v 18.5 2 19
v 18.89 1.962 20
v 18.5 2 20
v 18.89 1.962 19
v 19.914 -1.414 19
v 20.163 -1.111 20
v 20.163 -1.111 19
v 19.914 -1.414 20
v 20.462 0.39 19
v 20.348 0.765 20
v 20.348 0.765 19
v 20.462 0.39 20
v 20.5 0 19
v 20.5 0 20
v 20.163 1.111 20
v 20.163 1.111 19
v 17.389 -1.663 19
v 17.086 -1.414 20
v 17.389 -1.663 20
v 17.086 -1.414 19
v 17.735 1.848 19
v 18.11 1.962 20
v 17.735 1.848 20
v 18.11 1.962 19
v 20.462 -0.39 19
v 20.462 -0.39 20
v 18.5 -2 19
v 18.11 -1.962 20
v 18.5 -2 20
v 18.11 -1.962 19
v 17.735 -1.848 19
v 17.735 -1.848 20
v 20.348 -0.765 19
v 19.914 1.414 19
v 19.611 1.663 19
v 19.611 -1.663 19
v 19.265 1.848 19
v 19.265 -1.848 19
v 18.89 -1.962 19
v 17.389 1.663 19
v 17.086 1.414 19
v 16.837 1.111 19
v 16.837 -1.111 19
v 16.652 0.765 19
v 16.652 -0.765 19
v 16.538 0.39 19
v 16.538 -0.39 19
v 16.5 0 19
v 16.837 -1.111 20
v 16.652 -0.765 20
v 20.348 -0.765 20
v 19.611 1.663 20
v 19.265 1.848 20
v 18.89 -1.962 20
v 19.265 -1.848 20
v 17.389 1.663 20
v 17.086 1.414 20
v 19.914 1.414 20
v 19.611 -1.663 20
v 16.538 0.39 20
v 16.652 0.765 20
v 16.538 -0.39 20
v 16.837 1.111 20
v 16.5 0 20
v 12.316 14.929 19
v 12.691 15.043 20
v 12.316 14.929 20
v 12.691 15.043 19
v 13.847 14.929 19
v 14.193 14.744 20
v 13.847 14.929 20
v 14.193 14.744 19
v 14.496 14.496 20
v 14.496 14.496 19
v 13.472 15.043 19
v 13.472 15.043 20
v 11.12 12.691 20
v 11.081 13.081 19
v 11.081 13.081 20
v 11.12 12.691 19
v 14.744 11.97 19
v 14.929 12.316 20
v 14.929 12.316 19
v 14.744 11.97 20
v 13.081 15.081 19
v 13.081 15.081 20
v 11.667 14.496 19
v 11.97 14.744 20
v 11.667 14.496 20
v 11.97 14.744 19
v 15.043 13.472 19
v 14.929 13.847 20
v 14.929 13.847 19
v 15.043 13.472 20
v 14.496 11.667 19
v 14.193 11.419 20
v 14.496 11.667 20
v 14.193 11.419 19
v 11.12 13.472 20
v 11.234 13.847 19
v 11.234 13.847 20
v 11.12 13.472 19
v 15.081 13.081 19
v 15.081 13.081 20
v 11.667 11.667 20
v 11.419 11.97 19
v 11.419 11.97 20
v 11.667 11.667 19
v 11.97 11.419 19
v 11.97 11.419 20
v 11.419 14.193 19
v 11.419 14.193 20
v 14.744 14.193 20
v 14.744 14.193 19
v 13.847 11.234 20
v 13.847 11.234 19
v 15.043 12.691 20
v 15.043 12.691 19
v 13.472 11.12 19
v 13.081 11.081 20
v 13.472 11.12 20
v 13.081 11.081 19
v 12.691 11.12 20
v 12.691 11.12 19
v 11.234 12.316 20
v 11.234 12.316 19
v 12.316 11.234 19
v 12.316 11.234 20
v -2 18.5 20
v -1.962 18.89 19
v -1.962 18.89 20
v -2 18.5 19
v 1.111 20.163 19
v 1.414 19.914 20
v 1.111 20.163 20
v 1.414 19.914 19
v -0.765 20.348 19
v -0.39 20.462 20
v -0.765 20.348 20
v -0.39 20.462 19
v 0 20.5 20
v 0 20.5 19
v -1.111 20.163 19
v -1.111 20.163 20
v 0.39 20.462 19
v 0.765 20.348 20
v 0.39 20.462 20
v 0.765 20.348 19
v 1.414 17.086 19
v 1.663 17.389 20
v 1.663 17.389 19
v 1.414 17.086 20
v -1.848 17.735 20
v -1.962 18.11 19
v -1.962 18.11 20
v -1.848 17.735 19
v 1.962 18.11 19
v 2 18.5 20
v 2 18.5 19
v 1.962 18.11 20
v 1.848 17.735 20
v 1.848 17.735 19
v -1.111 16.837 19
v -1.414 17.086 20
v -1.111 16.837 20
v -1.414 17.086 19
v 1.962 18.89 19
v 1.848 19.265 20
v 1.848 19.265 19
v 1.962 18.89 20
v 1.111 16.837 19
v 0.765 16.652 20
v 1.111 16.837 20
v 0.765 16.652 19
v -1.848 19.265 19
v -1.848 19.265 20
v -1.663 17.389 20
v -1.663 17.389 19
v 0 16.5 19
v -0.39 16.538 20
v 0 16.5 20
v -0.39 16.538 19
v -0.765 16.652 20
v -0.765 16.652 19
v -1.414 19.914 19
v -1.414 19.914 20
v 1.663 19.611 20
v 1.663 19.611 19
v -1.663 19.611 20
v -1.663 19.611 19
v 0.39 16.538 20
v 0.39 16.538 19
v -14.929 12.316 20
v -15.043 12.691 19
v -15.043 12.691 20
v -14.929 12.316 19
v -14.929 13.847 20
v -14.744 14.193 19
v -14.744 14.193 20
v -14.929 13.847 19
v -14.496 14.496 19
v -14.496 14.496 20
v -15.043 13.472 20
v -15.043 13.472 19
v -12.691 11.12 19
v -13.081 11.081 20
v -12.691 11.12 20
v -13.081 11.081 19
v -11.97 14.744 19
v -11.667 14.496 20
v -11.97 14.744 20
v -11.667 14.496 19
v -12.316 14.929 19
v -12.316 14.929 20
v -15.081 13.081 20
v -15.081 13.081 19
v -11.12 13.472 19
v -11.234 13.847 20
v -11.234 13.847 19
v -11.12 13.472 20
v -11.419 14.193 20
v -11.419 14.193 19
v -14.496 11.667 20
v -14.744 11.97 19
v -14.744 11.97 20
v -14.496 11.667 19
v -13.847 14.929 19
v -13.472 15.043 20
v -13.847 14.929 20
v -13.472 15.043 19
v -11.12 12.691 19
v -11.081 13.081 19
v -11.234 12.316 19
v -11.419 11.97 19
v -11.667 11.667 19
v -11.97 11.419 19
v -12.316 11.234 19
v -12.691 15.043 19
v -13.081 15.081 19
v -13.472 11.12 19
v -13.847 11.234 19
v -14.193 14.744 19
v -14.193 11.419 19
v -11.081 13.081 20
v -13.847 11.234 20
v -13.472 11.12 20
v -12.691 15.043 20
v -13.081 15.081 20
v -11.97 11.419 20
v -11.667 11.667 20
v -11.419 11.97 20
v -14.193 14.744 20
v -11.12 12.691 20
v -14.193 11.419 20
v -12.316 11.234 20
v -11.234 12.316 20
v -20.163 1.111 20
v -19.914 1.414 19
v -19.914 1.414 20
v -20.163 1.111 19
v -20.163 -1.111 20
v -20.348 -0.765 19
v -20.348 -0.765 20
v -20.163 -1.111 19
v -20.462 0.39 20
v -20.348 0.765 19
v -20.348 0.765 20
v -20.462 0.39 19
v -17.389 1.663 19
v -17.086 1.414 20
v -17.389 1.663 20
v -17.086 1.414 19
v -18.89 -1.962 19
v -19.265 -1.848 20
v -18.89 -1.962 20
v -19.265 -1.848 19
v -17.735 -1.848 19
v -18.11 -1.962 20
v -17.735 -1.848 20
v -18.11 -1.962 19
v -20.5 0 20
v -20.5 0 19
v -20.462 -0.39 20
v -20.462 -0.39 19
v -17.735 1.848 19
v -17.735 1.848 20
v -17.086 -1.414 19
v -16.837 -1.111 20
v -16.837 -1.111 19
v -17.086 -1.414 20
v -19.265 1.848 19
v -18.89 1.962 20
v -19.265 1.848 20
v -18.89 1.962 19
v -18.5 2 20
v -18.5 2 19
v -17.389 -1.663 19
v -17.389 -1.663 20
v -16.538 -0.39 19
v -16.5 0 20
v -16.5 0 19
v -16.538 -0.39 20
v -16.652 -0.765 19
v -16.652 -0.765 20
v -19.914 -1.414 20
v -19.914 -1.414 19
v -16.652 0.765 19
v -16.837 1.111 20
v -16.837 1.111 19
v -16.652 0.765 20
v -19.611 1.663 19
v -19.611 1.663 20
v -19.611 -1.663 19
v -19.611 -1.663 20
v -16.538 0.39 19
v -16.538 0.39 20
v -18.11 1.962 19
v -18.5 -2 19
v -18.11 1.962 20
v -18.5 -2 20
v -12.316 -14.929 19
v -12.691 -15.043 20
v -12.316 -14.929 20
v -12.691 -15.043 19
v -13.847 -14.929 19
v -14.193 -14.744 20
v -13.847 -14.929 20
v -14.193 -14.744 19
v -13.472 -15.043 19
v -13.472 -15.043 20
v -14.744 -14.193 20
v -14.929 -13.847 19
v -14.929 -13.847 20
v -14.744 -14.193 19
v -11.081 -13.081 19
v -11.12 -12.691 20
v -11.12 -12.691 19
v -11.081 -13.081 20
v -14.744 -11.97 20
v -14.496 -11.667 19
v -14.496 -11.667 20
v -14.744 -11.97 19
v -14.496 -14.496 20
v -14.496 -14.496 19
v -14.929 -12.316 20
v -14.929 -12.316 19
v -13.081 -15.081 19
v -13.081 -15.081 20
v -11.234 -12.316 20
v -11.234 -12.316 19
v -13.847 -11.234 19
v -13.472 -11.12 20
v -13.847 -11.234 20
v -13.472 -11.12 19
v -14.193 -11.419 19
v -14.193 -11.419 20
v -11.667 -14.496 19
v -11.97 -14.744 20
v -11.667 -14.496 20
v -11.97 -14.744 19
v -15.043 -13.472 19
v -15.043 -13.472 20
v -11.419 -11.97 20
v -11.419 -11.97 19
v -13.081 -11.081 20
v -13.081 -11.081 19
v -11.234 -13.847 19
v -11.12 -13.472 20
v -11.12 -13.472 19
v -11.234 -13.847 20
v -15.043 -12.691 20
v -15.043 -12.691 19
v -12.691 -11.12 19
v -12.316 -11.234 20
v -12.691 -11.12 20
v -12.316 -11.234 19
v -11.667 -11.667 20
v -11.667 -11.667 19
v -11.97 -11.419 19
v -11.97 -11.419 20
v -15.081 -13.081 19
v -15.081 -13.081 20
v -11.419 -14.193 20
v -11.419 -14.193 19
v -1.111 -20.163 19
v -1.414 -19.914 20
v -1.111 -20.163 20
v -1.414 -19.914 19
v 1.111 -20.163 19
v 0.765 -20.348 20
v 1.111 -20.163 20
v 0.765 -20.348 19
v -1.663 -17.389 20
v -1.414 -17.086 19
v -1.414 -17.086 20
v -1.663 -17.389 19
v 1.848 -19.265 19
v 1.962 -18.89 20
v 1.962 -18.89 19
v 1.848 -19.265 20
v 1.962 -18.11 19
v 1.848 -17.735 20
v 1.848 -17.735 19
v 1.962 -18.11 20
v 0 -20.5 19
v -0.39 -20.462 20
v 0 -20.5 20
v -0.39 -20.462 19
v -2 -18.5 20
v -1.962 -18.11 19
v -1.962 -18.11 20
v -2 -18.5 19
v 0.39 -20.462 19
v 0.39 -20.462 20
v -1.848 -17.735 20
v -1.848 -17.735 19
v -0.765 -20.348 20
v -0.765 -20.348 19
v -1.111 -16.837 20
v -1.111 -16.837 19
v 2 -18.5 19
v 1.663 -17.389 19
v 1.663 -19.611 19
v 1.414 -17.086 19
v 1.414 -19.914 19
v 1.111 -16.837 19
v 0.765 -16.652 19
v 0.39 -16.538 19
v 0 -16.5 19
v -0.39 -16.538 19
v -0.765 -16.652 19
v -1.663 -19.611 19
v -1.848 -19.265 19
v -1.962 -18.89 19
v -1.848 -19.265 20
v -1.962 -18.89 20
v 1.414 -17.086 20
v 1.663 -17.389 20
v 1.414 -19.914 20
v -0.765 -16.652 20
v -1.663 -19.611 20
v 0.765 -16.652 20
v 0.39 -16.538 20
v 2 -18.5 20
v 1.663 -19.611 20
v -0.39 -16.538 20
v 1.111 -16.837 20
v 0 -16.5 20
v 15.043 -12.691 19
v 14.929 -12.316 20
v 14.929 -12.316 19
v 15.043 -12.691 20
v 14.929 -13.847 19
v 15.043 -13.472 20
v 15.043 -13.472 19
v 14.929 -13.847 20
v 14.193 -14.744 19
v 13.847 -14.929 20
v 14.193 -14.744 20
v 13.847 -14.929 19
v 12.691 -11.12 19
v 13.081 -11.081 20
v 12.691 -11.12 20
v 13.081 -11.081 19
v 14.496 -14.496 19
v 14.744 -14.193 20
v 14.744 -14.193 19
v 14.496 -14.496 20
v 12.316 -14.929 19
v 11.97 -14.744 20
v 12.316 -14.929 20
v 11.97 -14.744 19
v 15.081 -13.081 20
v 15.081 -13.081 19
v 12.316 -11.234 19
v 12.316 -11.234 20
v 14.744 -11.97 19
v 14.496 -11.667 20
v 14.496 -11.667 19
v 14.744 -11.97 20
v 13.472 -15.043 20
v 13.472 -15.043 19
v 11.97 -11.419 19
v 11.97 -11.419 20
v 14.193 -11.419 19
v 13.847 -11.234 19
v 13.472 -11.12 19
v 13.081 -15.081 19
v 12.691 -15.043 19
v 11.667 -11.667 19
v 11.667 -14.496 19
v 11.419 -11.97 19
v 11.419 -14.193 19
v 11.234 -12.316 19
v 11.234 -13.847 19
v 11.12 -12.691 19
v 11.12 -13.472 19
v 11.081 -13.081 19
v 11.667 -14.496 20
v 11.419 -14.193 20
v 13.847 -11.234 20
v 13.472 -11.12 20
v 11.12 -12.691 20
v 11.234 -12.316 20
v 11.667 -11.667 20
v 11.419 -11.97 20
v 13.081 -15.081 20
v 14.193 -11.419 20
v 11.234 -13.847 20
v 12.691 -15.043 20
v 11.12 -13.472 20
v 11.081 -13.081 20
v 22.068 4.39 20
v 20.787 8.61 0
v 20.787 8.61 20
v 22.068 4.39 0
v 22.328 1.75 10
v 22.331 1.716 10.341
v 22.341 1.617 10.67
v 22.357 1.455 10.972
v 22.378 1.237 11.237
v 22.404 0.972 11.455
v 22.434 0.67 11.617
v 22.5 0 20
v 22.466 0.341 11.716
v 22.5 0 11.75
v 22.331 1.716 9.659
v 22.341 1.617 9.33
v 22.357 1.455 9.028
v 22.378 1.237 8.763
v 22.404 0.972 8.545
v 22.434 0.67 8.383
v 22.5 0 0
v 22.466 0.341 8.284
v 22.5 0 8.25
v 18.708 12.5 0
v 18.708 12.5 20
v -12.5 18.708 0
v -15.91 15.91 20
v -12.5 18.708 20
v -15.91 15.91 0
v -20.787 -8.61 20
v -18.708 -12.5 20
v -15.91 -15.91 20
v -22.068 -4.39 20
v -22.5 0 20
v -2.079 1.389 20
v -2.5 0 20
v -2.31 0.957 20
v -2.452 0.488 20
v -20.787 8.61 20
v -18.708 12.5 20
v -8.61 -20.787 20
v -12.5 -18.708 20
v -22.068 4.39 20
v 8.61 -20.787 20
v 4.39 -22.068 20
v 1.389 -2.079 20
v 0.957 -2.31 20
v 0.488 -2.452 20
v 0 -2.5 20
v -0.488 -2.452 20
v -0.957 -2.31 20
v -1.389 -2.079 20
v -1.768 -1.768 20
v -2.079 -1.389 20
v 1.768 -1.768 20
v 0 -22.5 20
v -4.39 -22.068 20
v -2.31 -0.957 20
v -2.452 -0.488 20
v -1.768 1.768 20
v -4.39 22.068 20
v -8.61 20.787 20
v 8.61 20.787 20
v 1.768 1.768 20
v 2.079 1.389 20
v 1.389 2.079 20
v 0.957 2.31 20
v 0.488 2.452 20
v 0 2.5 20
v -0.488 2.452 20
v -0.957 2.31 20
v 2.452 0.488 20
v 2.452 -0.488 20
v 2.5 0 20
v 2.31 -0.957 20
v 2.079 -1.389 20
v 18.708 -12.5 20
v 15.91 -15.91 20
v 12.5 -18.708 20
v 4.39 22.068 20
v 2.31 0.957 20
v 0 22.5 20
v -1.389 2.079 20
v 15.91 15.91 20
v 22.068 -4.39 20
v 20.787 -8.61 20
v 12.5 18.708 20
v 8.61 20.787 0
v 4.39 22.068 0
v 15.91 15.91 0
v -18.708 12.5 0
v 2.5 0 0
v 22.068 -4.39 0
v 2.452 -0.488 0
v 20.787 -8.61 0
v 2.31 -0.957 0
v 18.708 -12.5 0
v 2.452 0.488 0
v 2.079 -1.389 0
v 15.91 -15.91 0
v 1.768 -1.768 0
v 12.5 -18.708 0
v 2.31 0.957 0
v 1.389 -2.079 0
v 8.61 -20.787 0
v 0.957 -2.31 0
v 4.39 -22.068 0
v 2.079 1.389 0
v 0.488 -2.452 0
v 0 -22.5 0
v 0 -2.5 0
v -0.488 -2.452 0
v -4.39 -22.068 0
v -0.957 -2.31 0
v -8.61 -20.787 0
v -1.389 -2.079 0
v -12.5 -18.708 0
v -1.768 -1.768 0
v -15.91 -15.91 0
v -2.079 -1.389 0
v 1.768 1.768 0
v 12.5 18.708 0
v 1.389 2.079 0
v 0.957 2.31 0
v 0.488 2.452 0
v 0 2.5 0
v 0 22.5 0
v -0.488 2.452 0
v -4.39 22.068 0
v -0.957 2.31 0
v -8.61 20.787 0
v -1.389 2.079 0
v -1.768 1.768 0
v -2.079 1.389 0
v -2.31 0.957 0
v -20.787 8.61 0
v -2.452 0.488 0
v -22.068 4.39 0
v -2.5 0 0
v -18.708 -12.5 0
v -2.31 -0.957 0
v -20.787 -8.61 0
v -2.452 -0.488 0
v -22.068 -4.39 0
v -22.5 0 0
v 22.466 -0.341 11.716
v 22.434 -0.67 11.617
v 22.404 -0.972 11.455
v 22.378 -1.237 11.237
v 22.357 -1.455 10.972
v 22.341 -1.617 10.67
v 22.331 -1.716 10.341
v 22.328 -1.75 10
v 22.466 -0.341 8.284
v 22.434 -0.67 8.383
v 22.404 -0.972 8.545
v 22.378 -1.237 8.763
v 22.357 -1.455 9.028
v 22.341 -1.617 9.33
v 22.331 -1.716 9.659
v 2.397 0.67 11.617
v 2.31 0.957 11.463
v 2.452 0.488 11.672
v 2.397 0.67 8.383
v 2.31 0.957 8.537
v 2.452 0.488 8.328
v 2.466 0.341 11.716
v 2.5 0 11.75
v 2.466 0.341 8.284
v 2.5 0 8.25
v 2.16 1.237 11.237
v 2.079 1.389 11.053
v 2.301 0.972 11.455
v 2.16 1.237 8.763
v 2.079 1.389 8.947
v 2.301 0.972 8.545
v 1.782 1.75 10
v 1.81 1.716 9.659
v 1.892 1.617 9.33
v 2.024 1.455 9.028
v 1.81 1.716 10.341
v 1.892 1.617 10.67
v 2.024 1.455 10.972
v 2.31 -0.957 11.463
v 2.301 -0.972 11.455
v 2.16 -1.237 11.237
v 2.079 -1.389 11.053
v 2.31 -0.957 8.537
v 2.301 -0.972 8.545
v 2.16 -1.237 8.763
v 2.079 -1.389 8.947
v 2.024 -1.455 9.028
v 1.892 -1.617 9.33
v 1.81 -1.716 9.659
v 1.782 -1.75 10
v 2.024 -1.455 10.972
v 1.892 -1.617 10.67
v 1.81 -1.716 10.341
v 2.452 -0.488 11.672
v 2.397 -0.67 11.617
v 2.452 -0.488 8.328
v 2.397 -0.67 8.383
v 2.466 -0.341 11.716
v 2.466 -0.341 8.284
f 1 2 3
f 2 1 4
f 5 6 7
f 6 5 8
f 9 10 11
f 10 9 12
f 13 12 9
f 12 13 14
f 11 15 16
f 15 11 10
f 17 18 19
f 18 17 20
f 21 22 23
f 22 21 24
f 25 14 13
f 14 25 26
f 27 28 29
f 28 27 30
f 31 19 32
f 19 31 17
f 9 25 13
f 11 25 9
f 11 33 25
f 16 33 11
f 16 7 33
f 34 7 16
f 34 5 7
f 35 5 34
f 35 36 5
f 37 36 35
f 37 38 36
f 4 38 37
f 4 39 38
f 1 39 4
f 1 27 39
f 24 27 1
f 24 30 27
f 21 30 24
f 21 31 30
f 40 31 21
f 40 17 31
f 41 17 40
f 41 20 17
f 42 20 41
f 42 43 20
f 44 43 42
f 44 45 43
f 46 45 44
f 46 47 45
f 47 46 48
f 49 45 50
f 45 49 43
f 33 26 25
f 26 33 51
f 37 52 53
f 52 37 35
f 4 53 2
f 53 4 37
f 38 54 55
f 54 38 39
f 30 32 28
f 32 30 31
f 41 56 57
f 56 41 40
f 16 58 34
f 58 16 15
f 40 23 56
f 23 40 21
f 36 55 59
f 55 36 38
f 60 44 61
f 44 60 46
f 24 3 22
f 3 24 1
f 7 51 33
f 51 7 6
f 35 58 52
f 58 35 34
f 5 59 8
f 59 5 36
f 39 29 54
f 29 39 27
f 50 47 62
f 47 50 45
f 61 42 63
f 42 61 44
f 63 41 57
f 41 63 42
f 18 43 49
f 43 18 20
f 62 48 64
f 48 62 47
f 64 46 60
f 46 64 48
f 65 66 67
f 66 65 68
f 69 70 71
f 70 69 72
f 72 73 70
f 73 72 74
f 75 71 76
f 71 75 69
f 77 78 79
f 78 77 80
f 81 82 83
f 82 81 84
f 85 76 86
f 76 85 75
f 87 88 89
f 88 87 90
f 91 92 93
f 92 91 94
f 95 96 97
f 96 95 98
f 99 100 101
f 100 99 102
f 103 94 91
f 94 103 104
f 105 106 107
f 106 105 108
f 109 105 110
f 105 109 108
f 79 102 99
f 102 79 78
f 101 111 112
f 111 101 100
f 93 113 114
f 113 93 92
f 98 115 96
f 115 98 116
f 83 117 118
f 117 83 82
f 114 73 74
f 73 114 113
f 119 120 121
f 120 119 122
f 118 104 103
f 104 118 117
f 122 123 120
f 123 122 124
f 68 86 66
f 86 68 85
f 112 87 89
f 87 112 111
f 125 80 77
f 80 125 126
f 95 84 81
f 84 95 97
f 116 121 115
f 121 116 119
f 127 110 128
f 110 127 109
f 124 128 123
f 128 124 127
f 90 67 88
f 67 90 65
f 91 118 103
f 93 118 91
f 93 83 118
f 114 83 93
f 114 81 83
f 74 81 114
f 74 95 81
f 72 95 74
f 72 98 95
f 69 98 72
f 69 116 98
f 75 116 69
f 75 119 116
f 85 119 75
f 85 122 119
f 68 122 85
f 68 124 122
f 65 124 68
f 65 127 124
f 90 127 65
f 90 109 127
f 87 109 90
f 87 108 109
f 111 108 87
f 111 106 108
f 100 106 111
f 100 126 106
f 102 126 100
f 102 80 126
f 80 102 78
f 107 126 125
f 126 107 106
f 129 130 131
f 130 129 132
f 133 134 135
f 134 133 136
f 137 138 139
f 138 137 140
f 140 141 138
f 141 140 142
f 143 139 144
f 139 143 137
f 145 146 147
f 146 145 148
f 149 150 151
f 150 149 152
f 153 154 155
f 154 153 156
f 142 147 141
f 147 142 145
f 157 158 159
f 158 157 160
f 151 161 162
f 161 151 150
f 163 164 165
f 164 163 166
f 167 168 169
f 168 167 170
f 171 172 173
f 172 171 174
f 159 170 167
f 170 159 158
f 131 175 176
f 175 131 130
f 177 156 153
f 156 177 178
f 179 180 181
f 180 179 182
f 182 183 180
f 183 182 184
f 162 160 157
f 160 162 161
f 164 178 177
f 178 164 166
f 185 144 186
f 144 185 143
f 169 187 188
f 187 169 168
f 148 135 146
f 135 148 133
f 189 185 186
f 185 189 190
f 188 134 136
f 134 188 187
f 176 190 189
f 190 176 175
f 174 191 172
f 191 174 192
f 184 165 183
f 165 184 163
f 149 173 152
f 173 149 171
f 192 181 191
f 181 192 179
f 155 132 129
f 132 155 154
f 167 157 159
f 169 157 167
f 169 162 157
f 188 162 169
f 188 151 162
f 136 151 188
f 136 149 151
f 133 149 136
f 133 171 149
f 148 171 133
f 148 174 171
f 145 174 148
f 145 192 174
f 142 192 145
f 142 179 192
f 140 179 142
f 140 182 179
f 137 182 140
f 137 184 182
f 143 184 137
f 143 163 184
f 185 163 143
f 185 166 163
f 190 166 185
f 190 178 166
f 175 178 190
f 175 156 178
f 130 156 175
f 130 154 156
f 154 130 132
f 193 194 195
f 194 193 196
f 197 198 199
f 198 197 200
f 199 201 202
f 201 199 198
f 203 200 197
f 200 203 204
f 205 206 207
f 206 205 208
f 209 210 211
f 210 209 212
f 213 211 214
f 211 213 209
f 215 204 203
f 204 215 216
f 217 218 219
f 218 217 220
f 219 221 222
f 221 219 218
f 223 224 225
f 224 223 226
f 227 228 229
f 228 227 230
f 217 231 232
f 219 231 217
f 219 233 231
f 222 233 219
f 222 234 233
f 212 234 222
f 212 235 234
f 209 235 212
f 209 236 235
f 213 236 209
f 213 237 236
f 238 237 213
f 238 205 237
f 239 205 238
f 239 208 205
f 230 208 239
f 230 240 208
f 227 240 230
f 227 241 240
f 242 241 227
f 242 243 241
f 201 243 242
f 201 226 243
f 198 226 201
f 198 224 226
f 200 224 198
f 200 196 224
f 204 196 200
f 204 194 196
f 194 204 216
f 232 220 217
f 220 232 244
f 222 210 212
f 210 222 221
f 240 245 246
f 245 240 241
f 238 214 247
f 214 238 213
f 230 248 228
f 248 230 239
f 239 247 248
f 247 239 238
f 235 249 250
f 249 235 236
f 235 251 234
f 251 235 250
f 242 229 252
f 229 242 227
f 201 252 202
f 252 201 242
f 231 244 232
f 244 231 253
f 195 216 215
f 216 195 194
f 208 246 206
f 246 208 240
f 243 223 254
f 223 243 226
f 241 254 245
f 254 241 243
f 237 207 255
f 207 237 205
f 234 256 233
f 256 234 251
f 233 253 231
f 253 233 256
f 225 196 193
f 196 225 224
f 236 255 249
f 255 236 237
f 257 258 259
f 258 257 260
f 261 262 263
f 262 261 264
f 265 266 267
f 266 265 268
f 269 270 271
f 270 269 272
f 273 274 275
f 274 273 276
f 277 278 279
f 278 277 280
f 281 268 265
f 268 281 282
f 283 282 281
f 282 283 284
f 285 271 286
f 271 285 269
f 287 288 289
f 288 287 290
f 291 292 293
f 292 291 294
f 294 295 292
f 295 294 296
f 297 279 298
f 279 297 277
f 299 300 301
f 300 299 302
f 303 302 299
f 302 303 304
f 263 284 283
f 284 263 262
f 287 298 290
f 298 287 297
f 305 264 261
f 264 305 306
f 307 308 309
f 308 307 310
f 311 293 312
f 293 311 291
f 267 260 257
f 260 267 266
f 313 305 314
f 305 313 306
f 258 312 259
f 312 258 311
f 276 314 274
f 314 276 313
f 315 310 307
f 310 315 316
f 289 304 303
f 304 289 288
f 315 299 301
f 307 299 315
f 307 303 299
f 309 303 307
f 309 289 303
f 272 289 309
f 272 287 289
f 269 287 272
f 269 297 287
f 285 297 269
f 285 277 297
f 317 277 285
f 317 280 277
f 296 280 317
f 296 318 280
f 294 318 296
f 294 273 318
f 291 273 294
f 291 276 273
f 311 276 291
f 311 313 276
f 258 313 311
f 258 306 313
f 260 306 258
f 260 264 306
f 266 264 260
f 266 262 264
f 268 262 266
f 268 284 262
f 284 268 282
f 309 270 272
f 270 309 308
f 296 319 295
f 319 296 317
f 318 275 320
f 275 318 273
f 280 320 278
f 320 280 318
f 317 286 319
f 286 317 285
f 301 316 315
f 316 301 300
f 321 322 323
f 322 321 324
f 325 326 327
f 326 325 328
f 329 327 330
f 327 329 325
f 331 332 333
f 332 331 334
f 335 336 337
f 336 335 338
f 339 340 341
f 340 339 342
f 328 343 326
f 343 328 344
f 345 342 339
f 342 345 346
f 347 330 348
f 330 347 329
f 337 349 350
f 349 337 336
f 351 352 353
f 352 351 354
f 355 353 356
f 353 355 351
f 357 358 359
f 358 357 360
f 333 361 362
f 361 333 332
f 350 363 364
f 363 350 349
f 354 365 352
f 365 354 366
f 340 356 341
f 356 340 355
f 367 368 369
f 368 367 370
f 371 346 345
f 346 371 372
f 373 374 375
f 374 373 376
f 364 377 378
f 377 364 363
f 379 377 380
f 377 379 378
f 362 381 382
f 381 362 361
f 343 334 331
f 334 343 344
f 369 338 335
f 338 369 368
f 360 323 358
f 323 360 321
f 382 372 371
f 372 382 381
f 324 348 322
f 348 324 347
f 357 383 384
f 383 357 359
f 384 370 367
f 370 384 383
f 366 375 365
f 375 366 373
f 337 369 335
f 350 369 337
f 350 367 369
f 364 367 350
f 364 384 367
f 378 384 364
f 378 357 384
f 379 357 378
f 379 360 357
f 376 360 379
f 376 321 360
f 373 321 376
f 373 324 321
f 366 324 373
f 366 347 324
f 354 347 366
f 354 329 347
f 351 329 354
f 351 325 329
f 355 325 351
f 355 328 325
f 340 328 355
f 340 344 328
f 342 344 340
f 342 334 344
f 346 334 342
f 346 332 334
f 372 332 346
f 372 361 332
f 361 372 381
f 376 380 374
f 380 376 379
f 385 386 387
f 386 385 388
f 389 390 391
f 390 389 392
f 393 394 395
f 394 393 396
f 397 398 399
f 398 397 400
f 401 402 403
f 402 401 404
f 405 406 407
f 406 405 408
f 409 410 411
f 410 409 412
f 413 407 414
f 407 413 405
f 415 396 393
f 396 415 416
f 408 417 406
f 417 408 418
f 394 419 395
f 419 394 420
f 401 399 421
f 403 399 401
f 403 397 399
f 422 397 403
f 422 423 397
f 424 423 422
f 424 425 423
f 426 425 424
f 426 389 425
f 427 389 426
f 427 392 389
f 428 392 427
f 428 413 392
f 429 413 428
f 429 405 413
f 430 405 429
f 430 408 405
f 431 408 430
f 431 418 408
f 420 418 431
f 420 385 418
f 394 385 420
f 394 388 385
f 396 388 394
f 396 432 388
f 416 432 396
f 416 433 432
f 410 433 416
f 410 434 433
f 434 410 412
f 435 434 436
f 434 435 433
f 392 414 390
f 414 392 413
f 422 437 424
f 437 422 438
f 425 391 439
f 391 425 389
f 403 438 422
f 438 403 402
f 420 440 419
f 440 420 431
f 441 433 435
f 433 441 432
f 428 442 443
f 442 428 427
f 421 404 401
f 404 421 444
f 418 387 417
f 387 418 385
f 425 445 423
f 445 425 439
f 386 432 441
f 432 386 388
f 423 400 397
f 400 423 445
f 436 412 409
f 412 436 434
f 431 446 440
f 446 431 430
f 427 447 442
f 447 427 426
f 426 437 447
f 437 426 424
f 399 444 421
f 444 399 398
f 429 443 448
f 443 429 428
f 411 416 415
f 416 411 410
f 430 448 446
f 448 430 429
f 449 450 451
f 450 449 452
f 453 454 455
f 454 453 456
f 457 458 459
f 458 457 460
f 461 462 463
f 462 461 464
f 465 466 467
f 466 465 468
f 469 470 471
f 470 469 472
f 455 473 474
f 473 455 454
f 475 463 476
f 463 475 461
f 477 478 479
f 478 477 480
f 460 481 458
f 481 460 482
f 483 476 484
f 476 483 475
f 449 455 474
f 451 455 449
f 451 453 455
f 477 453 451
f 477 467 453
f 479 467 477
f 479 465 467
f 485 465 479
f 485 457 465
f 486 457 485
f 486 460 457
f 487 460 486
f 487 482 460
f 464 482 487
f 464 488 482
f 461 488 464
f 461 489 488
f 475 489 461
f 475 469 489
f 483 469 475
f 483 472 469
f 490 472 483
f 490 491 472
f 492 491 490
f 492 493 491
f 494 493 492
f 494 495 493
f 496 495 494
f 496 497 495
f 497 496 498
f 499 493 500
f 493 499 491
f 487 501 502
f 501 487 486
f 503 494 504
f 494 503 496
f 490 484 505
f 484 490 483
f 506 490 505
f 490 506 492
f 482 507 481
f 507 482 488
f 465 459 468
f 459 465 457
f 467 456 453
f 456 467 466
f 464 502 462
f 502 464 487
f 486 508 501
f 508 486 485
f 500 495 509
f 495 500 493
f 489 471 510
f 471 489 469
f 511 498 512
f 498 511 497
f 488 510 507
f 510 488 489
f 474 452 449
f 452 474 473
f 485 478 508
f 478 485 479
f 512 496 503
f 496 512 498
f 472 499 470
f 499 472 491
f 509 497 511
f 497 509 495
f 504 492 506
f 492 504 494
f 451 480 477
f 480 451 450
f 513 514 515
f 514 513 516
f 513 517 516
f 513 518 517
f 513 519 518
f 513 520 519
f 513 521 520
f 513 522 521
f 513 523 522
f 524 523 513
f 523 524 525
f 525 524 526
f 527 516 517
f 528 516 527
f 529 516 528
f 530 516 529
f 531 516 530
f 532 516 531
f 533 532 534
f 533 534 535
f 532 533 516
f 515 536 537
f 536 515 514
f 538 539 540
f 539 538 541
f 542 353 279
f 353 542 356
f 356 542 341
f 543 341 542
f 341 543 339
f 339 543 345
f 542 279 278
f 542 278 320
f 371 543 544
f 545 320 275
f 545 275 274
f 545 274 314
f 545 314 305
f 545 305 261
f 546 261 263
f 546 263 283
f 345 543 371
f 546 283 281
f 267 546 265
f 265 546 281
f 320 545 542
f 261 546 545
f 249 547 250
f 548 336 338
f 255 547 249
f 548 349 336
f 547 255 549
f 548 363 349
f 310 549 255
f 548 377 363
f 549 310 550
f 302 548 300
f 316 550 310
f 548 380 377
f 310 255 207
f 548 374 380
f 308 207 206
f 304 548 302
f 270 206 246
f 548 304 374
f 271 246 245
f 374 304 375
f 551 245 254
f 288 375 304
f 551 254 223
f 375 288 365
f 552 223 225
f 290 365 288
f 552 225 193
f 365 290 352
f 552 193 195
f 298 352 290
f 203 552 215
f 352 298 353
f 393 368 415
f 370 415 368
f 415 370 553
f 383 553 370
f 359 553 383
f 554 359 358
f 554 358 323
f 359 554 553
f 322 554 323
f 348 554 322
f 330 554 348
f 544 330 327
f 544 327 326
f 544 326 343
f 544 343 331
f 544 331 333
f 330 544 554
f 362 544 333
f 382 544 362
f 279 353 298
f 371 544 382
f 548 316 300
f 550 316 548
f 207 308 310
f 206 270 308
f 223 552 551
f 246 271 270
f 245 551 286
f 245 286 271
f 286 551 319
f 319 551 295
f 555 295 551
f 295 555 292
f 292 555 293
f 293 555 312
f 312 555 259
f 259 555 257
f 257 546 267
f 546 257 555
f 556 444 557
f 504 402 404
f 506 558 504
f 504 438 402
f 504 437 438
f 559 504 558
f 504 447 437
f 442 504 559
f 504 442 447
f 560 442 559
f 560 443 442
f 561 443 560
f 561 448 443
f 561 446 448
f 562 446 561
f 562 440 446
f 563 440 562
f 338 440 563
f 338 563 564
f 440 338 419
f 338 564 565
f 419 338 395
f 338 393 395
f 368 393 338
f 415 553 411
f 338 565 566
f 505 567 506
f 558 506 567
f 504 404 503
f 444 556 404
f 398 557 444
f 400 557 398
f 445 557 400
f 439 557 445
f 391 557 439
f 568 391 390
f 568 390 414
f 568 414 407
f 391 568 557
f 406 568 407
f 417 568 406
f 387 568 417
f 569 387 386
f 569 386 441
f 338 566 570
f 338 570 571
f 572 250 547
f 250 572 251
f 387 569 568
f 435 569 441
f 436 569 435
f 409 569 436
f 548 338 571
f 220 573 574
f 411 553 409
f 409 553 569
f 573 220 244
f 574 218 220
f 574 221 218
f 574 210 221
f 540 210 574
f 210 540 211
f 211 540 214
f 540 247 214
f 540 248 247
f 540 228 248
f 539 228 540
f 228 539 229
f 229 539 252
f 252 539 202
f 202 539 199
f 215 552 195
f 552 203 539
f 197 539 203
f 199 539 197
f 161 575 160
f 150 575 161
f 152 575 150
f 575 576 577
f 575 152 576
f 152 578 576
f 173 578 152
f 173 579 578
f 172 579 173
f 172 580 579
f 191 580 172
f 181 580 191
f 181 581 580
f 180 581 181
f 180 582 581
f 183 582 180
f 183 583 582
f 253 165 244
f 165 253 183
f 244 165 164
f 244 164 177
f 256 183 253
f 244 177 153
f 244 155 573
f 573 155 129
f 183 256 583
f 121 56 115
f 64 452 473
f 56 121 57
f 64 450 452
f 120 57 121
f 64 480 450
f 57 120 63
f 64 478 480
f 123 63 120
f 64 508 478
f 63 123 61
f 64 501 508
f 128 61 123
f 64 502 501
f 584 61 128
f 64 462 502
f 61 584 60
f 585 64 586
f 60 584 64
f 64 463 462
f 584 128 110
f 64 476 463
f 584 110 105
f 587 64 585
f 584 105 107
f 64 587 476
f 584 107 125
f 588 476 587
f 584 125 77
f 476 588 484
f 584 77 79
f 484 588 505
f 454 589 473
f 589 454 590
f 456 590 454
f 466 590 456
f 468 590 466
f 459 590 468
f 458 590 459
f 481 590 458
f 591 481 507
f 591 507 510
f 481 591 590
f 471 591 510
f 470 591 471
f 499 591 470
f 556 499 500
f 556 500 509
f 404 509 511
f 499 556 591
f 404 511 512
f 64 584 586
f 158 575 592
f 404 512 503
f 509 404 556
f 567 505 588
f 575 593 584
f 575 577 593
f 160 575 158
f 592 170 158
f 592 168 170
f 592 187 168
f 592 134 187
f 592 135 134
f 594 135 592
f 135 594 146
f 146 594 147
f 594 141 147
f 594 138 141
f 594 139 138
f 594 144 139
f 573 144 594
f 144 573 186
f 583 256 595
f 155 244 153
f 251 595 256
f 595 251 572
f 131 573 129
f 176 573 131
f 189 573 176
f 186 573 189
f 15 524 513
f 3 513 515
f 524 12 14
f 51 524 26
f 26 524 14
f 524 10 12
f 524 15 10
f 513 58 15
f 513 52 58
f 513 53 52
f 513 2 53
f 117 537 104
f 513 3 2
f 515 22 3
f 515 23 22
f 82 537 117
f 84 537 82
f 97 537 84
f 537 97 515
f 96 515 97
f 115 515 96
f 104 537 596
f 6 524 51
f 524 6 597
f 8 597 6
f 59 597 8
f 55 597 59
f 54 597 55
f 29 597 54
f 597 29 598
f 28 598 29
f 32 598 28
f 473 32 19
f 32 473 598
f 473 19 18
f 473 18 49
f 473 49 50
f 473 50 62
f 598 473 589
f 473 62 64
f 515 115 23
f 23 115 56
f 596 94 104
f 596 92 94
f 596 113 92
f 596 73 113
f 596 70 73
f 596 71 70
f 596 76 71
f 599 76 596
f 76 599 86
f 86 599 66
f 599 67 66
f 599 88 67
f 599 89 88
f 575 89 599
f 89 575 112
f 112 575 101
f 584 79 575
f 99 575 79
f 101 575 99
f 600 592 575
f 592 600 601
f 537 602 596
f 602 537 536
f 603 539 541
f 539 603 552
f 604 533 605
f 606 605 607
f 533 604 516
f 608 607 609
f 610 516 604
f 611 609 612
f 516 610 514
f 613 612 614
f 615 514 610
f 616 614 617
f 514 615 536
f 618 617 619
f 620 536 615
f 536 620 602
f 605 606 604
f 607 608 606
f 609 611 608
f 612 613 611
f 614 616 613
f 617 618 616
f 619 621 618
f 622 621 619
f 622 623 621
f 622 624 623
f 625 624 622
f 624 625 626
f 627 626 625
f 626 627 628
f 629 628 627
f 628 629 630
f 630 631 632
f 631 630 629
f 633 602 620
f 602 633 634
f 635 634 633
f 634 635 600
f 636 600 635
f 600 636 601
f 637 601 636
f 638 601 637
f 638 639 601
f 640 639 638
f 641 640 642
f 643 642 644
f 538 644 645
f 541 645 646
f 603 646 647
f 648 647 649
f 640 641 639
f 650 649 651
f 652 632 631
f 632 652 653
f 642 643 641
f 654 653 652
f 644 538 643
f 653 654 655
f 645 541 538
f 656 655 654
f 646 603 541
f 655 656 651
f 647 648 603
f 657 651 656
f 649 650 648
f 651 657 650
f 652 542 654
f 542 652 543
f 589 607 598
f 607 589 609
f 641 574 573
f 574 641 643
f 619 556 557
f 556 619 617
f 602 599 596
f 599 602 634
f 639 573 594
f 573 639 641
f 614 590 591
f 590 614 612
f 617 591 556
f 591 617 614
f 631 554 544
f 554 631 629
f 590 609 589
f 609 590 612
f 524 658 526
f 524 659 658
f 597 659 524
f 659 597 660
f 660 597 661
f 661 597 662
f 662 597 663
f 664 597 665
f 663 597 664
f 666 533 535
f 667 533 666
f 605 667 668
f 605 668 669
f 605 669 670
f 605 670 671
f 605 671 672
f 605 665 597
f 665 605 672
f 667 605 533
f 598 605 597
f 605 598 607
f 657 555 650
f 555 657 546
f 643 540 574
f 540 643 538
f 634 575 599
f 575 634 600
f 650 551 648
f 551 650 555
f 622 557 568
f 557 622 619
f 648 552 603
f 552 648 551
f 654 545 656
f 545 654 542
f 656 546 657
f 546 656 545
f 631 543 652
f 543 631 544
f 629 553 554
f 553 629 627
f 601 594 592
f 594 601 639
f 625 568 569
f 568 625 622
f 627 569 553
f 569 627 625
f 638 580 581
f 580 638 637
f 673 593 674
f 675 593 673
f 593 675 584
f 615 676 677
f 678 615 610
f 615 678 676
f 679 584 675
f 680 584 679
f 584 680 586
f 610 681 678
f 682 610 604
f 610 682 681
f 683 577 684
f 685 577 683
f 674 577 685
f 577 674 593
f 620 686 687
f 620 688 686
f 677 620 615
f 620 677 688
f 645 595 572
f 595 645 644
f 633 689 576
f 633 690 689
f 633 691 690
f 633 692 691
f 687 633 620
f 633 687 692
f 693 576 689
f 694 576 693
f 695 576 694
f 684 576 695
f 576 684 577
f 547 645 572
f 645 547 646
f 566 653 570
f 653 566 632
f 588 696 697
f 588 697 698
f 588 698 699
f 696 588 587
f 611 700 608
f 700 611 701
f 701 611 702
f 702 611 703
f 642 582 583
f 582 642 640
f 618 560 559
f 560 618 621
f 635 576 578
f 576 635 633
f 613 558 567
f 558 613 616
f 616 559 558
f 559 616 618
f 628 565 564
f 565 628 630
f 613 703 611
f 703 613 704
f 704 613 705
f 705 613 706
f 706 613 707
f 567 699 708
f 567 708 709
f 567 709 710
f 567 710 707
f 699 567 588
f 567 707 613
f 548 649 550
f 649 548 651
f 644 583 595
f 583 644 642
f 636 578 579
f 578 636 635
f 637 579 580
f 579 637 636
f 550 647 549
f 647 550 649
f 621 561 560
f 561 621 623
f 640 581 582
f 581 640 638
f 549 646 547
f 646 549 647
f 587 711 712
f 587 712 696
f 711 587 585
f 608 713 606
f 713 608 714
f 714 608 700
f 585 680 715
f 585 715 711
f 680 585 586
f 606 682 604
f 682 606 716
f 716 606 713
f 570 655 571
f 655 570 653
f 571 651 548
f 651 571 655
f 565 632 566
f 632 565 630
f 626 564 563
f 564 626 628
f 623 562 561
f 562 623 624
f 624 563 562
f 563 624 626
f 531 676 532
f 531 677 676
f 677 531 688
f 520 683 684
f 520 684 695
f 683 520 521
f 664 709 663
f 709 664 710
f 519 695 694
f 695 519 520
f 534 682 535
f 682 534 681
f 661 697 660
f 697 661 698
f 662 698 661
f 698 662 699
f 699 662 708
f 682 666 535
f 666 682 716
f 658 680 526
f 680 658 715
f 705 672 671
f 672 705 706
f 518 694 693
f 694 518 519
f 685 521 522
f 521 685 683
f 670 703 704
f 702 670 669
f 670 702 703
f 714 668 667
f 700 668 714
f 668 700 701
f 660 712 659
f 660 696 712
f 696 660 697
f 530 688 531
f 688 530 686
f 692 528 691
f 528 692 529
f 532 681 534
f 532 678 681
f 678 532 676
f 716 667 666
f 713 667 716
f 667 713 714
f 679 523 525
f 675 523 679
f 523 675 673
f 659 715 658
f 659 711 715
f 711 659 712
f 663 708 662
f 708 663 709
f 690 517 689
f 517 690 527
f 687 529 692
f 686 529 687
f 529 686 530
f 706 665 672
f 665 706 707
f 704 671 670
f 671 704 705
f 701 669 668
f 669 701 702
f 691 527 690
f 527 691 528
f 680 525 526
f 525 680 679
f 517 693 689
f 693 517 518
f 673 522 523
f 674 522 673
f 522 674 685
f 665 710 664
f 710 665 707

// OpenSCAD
$fn = 32;

// ----------------------------------------------------------------------
// Control knob: dimpled knob
// ----------------------------------------------------------------------

// --- parameters (mm) ---
dimp_d = 4;               // finger dimple diameter
n_dimp = 8;               // number of dimples
dimp_r = 18.5;            // dimple ring radius
knob_d = 45;              // knob body diameter
knob_h = 20;              // knob body height
bore_d = 5;               // shaft bore diameter
set_d = 3.5;              // set screw bore diameter

dimp_step = 360 / n_dimp;  // dimple angular step

difference() {
  cylinder(h = knob_h, d = knob_d);
  translate([0, 0, -1]) cylinder(h = knob_h + 2, d = bore_d);
  translate([-1, 0, knob_h / 2]) rotate([0, 90, 0])
    cylinder(h = knob_d / 2 + bore_d / 2 + 2, d = set_d);  for (i = [0 : n_dimp - 1])
    rotate([0, 0, i * dimp_step])
      translate([dimp_r, 0, knob_h - 1])
        cylinder(h = 2, d = dimp_d);
}
